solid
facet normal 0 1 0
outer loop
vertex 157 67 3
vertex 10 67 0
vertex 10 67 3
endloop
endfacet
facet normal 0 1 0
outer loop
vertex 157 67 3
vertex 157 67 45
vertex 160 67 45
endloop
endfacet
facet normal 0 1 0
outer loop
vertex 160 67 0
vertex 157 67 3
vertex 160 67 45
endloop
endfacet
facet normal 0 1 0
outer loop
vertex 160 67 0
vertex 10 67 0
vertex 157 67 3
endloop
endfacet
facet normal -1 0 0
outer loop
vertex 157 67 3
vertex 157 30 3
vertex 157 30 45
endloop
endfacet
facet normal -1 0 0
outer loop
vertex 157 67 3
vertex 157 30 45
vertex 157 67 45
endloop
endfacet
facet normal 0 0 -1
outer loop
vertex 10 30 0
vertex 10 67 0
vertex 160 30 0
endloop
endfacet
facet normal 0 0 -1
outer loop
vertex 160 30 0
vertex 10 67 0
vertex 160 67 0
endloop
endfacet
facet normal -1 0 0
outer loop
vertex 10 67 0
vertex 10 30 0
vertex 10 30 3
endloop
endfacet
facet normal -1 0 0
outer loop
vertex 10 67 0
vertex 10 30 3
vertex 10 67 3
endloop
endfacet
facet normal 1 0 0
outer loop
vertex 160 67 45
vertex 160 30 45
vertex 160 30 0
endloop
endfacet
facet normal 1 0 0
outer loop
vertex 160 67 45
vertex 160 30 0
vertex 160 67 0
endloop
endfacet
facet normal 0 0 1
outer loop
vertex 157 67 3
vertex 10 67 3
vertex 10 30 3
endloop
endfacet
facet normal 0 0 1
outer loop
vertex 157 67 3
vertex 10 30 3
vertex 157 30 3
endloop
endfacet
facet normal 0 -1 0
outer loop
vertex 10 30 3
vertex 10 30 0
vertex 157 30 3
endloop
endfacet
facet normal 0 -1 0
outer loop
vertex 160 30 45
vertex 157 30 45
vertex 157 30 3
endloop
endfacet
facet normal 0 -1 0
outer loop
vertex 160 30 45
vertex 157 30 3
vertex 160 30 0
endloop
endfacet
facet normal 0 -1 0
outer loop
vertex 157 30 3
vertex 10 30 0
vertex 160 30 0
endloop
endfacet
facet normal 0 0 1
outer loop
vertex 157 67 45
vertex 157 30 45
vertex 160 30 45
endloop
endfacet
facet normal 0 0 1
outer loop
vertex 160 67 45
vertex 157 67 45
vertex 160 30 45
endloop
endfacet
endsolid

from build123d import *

# Parameters (mm, degrees)
BOX024_W     = 150
BOX024_H     = 37
BOX024_DEPTH = 45
BOX023_W     = 150
BOX023_H     = 37
BOX023_DEPTH = 45


with BuildPart() as w_rfel017:
    # Box024 → Box024 (new body)
    with BuildSketch(Plane(origin=(-3, 0, 3), x_dir=(1, 0, 0), z_dir=(0, 0, 1))):
        with Locations((75, 18.5)):
            Rectangle(BOX024_W, BOX024_H)
    extrude(amount=BOX024_DEPTH)


with BuildPart() as cut018:
    # Box023 → Box023 (new body)
    with BuildSketch(Plane.XY):
        with Locations((75, 18.5)):
            Rectangle(BOX023_W, BOX023_H)
    extrude(amount=BOX023_DEPTH)

    # Cut018: cut Würfel017
    add(w_rfel017.part, mode=Mode.SUBTRACT)


with BuildPart() as cut018_1:
    # Cut018 placement: moved
    add(cut018.part.moved(Location((10, 30, 0))))


solid = cut018_1.part
